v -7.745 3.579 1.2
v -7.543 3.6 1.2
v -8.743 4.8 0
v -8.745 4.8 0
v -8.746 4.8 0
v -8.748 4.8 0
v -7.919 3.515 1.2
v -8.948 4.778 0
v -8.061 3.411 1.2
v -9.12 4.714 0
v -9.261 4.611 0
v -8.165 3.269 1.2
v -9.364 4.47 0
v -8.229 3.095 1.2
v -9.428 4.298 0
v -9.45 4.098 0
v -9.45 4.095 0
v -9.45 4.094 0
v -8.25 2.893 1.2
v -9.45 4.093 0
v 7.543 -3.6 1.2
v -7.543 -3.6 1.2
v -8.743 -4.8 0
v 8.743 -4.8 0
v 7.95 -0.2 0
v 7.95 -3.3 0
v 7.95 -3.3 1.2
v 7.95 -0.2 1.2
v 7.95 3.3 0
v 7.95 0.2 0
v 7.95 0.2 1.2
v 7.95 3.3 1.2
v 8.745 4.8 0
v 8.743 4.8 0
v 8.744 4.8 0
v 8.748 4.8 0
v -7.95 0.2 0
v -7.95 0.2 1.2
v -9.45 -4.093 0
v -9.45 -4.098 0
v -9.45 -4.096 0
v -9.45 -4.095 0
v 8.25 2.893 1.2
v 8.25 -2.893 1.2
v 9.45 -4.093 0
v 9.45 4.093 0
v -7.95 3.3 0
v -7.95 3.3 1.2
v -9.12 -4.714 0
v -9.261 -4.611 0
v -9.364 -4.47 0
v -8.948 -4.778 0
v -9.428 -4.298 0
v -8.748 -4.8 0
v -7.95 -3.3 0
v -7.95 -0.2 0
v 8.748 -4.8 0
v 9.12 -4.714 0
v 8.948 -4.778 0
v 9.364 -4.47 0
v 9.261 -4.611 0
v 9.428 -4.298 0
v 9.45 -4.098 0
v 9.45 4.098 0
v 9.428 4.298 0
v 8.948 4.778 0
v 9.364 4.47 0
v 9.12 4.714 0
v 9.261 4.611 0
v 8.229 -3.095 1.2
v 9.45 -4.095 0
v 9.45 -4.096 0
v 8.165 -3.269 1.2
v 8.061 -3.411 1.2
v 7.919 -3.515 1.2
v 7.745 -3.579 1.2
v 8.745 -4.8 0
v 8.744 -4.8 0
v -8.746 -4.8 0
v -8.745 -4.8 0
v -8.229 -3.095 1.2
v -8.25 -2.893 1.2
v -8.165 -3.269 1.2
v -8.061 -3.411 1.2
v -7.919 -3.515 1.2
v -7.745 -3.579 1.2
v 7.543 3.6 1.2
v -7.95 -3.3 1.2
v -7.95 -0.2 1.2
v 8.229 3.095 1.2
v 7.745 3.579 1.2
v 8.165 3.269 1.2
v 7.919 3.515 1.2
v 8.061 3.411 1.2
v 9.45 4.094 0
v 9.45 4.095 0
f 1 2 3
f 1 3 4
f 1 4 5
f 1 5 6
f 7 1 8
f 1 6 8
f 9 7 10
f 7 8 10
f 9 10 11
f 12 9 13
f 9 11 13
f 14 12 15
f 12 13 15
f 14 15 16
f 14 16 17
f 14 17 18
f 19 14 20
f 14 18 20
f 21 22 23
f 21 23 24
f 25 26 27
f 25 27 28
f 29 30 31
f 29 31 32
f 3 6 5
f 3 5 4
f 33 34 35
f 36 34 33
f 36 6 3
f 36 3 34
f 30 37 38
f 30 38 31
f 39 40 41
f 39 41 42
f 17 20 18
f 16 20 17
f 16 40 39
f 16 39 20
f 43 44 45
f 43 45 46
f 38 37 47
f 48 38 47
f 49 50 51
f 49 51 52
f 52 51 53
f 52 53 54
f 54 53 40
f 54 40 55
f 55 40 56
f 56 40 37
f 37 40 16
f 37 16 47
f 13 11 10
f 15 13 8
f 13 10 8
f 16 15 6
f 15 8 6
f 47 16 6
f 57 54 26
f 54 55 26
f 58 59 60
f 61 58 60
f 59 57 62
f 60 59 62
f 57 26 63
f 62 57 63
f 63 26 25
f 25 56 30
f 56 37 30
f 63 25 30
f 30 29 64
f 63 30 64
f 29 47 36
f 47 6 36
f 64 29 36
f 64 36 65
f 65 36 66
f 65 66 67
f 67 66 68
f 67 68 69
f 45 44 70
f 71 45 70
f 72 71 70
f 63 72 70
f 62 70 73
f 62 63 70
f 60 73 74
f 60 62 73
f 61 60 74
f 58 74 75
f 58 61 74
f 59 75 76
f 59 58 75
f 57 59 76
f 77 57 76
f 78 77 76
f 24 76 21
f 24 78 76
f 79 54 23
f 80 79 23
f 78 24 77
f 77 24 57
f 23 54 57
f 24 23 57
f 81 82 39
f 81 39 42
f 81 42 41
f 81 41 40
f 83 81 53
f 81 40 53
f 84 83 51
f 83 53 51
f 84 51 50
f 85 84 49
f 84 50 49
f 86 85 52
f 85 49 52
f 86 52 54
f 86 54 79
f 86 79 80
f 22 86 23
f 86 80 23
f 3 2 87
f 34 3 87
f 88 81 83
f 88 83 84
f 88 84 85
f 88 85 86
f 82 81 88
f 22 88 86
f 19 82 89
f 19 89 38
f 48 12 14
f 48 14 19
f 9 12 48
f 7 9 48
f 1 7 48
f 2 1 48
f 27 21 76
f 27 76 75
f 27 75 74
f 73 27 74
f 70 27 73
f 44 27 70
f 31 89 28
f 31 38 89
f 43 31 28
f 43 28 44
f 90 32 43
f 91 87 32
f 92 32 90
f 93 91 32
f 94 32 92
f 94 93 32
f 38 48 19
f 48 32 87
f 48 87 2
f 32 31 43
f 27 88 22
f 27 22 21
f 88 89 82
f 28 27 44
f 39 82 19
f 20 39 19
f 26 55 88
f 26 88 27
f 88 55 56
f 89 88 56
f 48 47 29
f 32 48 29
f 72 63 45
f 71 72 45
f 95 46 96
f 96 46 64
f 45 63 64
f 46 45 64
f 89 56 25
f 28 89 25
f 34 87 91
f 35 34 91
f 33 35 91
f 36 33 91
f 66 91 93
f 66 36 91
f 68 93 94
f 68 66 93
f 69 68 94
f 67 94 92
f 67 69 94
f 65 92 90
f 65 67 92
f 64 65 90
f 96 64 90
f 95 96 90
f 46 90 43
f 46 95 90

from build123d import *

# Parameters (mm, degrees)
F0_W        = 18.9
F0_H        = 9.6
F0_W_2      = 15.9
F0_H_2      = 3.1
F1_DEPTH    = 1.2
F2_SIZE     = 1.19999
F3_T1_DEPTH = 4.9651949945
F3_T3_DEPTH = 4.9651949945
F3_T5_DEPTH = 4.9651949945
F3_T7_DEPTH = 4.9651949945


# Not quite as in the source:
# - a fillet or chamfer that OpenCascade refuses, or shapes differently, is made with other operations: its cross-section is extruded or revolved along the edge and cut away or added
# - a fillet or chamfer is up to 0.001 mm smaller than in the source, because OpenCascade refuses the exact size


with BuildPart() as f1:
    # F0 (on Top) → F1 (new body)
    with BuildSketch(Plane.XY):
        Rectangle(F0_W, F0_H)
        with Locations((0, -1.75)):
            Rectangle(F0_W_2, F0_H_2, mode=Mode.SUBTRACT)
        with Locations((0, 1.75)):
            Rectangle(F0_W_2, F0_H_2, mode=Mode.SUBTRACT)
    extrude(amount=F1_DEPTH)

    # F2 (size 1.2 in the source; OpenCascade refuses exactly that, so slightly less here)
    f2_edges = [f1.edges().sort_by_distance(p)[0] for p in [
        (0, -4.8, 1.2),
        (-9.45, 0, 1.2),
        (9.45, 0, 1.2),
        (0, 4.8, 1.2),
    ]]
    chamfer(f2_edges, length=F2_SIZE)

    # F3: fillet of radius 1 on 4 edges, made by hand

    # F3_s2 → F3_t1 (cut)
    with BuildSketch(Plane(origin=(-5.58333, -5.58333, -5.58333), x_dir=(-0.7071067812, 0.7071067812, 0), z_dir=(0.5773502692, 0.5773502692, 0.5773502692))):
        with BuildLine():
            ThreePointArc((3.7880465325, 5.5288711695), (3.2880465325, 5.6628457657), (2.7880465325, 5.5288711695))
            Line((2.7880465325, 5.5288711695), (3.2880465325, 5.8175463041))
            Line((3.2880465325, 5.8175463041), (3.7880465325, 5.5288711695))
        make_face()
    extrude(amount=F3_T1_DEPTH, mode=Mode.SUBTRACT)

    # F3_s4 → F3_t3 (cut)
    with BuildSketch(Plane(origin=(5.58333, -5.58333, -5.58333), x_dir=(-0.7071067812, -0.7071067812, 0), z_dir=(-0.5773502692, 0.5773502692, 0.5773502692))):
        with BuildLine():
            ThreePointArc((-3.7880465325, 5.5288711695), (-3.2880465325, 5.6628457657), (-2.7880465325, 5.5288711695))
            Line((-2.7880465325, 5.5288711695), (-3.2880465325, 5.8175463041))
            Line((-3.2880465325, 5.8175463041), (-3.7880465325, 5.5288711695))
        make_face()
    extrude(amount=F3_T3_DEPTH, mode=Mode.SUBTRACT)

    # F3_s6 → F3_t5 (cut)
    with BuildSketch(Plane(origin=(5.58333, 5.58333, -5.58333), x_dir=(0.7071067812, -0.7071067812, 0), z_dir=(-0.5773502692, -0.5773502692, 0.5773502692))):
        with BuildLine():
            ThreePointArc((2.7880465325, 5.5288711695), (3.2880465325, 5.6628457657), (3.7880465325, 5.5288711695))
            Line((3.7880465325, 5.5288711695), (3.2880465325, 5.8175463041))
            Line((3.2880465325, 5.8175463041), (2.7880465325, 5.5288711695))
        make_face()
    extrude(amount=F3_T5_DEPTH, mode=Mode.SUBTRACT)

    # F3_s8 → F3_t7 (cut)
    with BuildSketch(Plane(origin=(-5.58333, 5.58333, -5.58333), x_dir=(0.7071067812, 0.7071067812, 0), z_dir=(0.5773502692, -0.5773502692, 0.5773502692))):
        with BuildLine():
            ThreePointArc((-2.7880465325, 5.5288711695), (-3.2880465325, 5.6628457657), (-3.7880465325, 5.5288711695))
            Line((-3.7880465325, 5.5288711695), (-3.2880465325, 5.8175463041))
            Line((-3.2880465325, 5.8175463041), (-2.7880465325, 5.5288711695))
        make_face()
    extrude(amount=F3_T7_DEPTH, mode=Mode.SUBTRACT)


solid = f1.part
